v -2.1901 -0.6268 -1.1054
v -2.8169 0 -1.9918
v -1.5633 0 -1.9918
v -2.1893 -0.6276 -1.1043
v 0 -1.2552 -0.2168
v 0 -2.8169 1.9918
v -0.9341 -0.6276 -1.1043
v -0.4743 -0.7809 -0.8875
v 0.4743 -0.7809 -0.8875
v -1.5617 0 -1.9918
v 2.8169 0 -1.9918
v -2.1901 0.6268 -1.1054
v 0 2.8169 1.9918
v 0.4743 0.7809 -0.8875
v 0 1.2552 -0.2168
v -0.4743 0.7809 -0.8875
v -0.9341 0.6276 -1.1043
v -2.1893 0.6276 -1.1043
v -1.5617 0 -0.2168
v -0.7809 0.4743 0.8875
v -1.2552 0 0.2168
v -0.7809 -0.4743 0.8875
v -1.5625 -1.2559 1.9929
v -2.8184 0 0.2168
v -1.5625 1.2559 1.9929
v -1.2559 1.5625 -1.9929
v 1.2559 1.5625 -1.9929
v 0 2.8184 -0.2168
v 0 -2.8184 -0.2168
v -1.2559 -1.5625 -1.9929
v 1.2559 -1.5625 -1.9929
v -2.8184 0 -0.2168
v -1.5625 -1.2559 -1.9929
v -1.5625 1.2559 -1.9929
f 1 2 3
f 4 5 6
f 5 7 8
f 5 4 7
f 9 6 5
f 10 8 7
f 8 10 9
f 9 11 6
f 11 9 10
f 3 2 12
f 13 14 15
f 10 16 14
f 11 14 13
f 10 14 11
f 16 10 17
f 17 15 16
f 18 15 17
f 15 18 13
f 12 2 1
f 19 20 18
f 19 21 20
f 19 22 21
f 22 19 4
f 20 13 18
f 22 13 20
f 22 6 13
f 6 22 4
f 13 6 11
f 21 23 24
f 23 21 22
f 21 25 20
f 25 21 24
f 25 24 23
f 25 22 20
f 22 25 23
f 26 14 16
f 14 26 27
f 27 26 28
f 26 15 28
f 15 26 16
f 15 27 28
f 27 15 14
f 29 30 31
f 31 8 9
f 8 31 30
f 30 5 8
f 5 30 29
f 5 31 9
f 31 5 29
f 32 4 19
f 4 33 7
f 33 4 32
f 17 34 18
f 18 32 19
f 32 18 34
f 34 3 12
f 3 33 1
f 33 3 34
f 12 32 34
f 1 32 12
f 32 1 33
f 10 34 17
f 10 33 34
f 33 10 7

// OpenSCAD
sqrt22 = sqrt(2)/2;
shift = 0.11;




module octahedron() {
    
//     octo_points = [
//        0.5 * [-1, -1, 0], // belt
//        0.5 * [ 1, -1, 0], 
//        0.5 * [ 1,  1, 0], 
//        0.5 * [-1,  1, 0], 
//        [0, 0, sqrt22], // top
//        [0, 0, -sqrt22], // bottom
//    ];
//
//    octo_faces = [
//        [0, 1, 4], // top pyramid
//        [1, 2, 4],
//        [2, 3, 4],
//        [3, 0, 4],
//        [1, 0, 5], // bottom pyramid
//        [2, 1, 5],
//        [3, 2, 5],
//        [0, 3, 5],
//    ];
//    
//
//
//    polyhedron(
//        points = octo_points,
//        faces = octo_faces
//    );
    
    
        intersection(){
        rotate(R0) translate([-1/2, -1, 0]) rotate(acos(sqrt(3)/3) * Y) translate(-1/2 * X) cube(2);
        rotate(R90) translate([-1/2, -1, 0]) rotate(acos(sqrt(3)/3) * Y) translate(-1/2 * X) cube(2);
        rotate(R180) translate([-1/2, -1, 0]) rotate(acos(sqrt(3)/3) * Y) translate(-1/2 * X) cube(2);
        rotate(R270) translate([-1/2, -1, 0]) rotate(acos(sqrt(3)/3) * Y) translate(-1/2 * X) cube(2);
        mirror(Z) rotate(R0) translate([-1/2, -1, 0]) rotate(acos(sqrt(3)/3) * Y) translate(-1/2 * X) cube(2);
        mirror(Z) rotate(R90) translate([-1/2, -1, 0]) rotate(acos(sqrt(3)/3) * Y) translate(-1/2 * X) cube(2);
        mirror(Z) rotate(R180) translate([-1/2, -1, 0]) rotate(acos(sqrt(3)/3) * Y) translate(-1/2 * X) cube(2);
        mirror(Z) rotate(R270) translate([-1/2, -1, 0]) rotate(acos(sqrt(3)/3) * Y) translate(-1/2 * X) cube(2);
        
    }
}

module octo_flake(size, iteration, overlap, slit, throat){
    intersection(){
        inner_flake(size - overlap, iteration, overlap, slit, throat); // Account for the overlap in the total size
        translate([-size, -size, 0]) cube([2, 2, 1] *  size); // Grab the top half
    }
}

 
 module inner_flake(size, iteration, overlap, slit, throat){
     assert(iteration >= 0, "Negative iteration value");
     assert(overlap > slit ||  overlap == 0 && slit == 0  , "Overlap must be greater than slit width");
     
     module smol(translation){
         translate(translation)
         inner_flake(size/2 + 0.01, iteration-1, overlap, slit, throat);
     }
     
     module smol_belt(shift, rotation){
         rotate([0, 0, rotation])
         intersection(){
             #translate([slit/2, slit/2, -size/2]) cube([size, size, size]);
             smol([shift, shift, 0]);
             
         }
     }
     
    if (iteration == 0) { 
        scale([1, 1, 1] * (size + overlap)) octahedron();
    } else {
        shift = 0.25 * size;

//        render()
        intersection() {
            scale((overlap + size) * [1, 1, 1]) octahedron();
            union() {
                cube(2*throat * [1, 1, 1], center=true);
                smol_belt(shift, 0);
                smol_belt(shift, 90);
                smol_belt(shift, 180);
                smol_belt(shift, 270);
                smol([0, 0, shift * 2 * sqrt22 - .001]); // Weld back together with top and bottom sub-octoflakes
                smol([0, 0, -shift * 2 * sqrt22 + .001]);
            };
        };
        
//        render()
//        union(){
//            difference(){
//                union () { 
//                    smol([shift, shift, 0]); // Assemble the belt of sub-octoflakes
//                    smol([shift, -shift, 0]) ;
//                    smol([-shift, -shift, 0]);
//                    smol([-shift, shift, 0]) ;
//                };
//          
//                cube([slit, 2 * size, size], center=true); // Chop apart the belt, to give continious cross-section
//                cube([2 * size, slit, size], center=true);
//          
//            };
//            cube(2*overlap * [1, 1, 1], center=true);
//            smol([0, 0, shift * 2 * sqrt22 - .001]); // Weld back together with top and bottom sub-octoflakes
//            smol([0, 0, -shift * 2 * sqrt22 + .001]);
//        };
      
    }  
 }
 
 
 



//octahedron();


//ref_size = 200;
//ref_i = 7;
//ref_n = 2 ^ ref_i;
//i = 3;
//n= 2 ^ i;
//size = ref_size/ref_n * n;
// 
//unit = 5;
//size = n * (unit-overlap) + overlap;
// 
//overlap = 1;
//slit = 0.5;
//throat = overlap + slit;
//
//
//echo(i, n, size);
//
//octo_flake(size, iteration = i , overlap = overlap, slit = slit, throat = throat);
 
 
 
  
 
 
 
 
 
 







I = [1, 1, 1];
X = [1, 0, 0];
Y = [0, 1, 0];
Z = [0, 0, 1];
R0 = 0 * Z;
R45 = 45 * Z;
R90 = 90 * Z;
R180 = 180 * Z;
R270 = 270 * Z;
T_A = [1/2,     0,      sqrt22/2];
T_B = [-1/2,    0,      sqrt22/2];
T_C = [0,       1/2,    -sqrt22/2];
T_D = [0,       -1/2,   -sqrt22/2];

T_W = [1/2,     0,      -sqrt22/2];
T_X = [-1/2,    0,      -sqrt22/2];
T_Y= [0,       1/2,    sqrt22/2];
T_Z = [0,       -1/2,   sqrt22/2];
eps = 0.01;


module copy_mirror(vec=[0,1,0])
{
    children();
    mirror(vec) children();
}



module sub_octo(iteration, size, overlap, slit){
    
    
    
    rotate(R0) translate( 0 * size * X) sub_octo_sector(iteration, size, overlap, slit, slit/2);
    mirror([1, 1, 0]) translate( 0 * size * X) sub_octo_sector(iteration, size, overlap, slit, slit/2);
    mirror([1, -1, 0]) translate( 0 * size * X) sub_octo_sector(iteration, size, overlap, slit, slit/2);
    mirror([1, 0, 0]) translate( 0 * size * X) sub_octo_sector(iteration, size, overlap, slit, slit/2);
//    rotate(R180) translate( 0 * size * X) sub_octo_sector(iteration, size, overlap, slit);
//    rotate(R270) translate( 0 * size * X) sub_octo_sector(iteration, size, overlap, slit);
    
    
    //// union of sectors 1:12 single sector 30
//    intersection() {
////        translate(size * [ -1, -1, 0]) cube( size * [2, 2, 1]);
//        union() {
//            rotate(R0) translate( size * X) sub_octo_sector(iteration, size, overlap, slit);
////            rotate(R90) translate( size * X) sub_octo_sector(iteration, size, overlap, slit);;
////            rotate(R180) translate( size * X) sub_octo_sector(iteration, size, overlap, slit);
////            rotate(R270) translate( size * X) sub_octo_sector(iteration, size, overlap, slit);
//        }
//    }
//    
    
    
    
//    module cuts() {
//        translate((size- overlap/2) * T_A) octo_cuts(iteration, size - overlap/2, overlap, slit);
//        slits(iteration, size - overlap/2, overlap, slit);
//    }
    
    
    
    
    //// Straight difference 1:25 -1 :23
//    difference() {
//        scale(size * I ) octahedron();
//        translate(-size * Z) cube( 2 * size * I, center = true);
//        
//
//        
//        rotate(R0) translate((size- overlap/2) * T_A) octo_cuts(iteration, size - overlap/2, overlap, slit);
//        rotate(R90) translate((size- overlap/2) * T_A) octo_cuts(iteration, size - overlap/2, overlap, slit);
//        rotate(R180) translate((size- overlap/2) * T_A) octo_cuts(iteration, size - overlap/2, overlap, slit);
//        rotate(R270) translate((size- overlap/2) * T_A) octo_cuts(iteration, size - overlap/2, overlap, slit);
//        
//                        rotate(R0) slits(iteration, size - overlap/2, overlap, slit);
//        rotate(R90) slits(iteration, size - overlap/2, overlap, slit);
//        rotate(R180) slits(iteration, size - overlap/2, overlap, slit);
//        rotate(R270) slits(iteration, size - overlap/2, overlap, slit);
//
//    }


        
    
    //// intersection of sectors 1:52
    
//    module sector() {
//    difference() {
//        scale(size * I ) octahedron();
//        translate(-size * Z) cube( 2 * size * I, center = true);
//        rotate(R0) translate((size- overlap/2) * T_A) octo_cuts(iteration, size - overlap/2, overlap, slit);
//        slits(iteration, size - overlap/2, overlap, slit);
//    }
//}
//    
//
//intersection(){
//            rotate(R0) sector();
//            rotate(R90) sector();
//            rotate(R180) sector();
//            rotate(R270) sector();
//}
    
    
    
}


module sub_octo_sector(iteration, size, overlap, slit, weld_allowance = 0){
    difference(){
        intersection(){
            scale(size * I ) octahedron();
            rotate(-R45) translate(weld_allowance * I) cube(size);
        }
        translate((size- overlap/2) * T_A) octo_cuts(iteration, size - overlap/2, overlap, slit);
        slits(iteration, size - overlap/2, overlap, slit);
    }
};




outer = 0;
face = 1;
edge = 2;




module octo_cuts(iteration, size, overlap, slit, position = outer){
    if (iteration > 0){
//        if (true){
//            intersection() {
//                cube((size - overlap - slit) * [1, 1, 2], center = true);
//                scale(( (size * .999) - overlap ) * I ) tetra();
//            }
//        }
        
        
        if (position == outer){
            intersection() {
                cube((size - overlap - slit) * [1, 1, 2], center = true);
                scale(( (size * .999) - overlap ) * I ) neo_tetra();
            }
            translate(size * T_B/2) octo_cuts(iteration - 1, size/2, overlap, slit, outer);
            translate(size * T_C/2) octo_cuts(iteration - 1, size/2, overlap, slit, outer);
            translate(size * T_D/2) octo_cuts(iteration - 1, size/2, overlap, slit, outer);
            translate(size * T_X/2) octo_cuts(iteration - 1, size/2, overlap, slit, face);
            
            
            // For 3d printing the Koch surface
            
//            translate(size * T_B/2 + size/2) octo_cuts(1, size/2, overlap, slit, outer);
//            translate(size * T_C/2) octo_cuts(1, size/2, overlap, slit, outer);
//            translate(size * T_D/2) octo_cuts(1, size/2, overlap, slit, outer);


        }
        
        if (position == face) {
            intersection() {
                cube((size - overlap - slit) * [1, 1, 2], center = true);
                scale(( (size * .999) - overlap ) * I ) mirror(Z) neo_tetra();
            }
            
            translate(size * T_X/2) octo_cuts(iteration - 1, size/2, overlap, slit, face); // prune
            
            
            
            translate(size * T_B/2) mirror(Z) octo_cuts(iteration - 1, size/2, overlap, slit, face);
            translate(size * T_C/2) rotate(-R90) octo_cuts(iteration - 1, size/2, overlap, slit, face);
            translate(size * T_D/2) rotate(R90) octo_cuts(iteration - 1, size/2, overlap, slit, face);
            

            
            
            translate(size * T_W/2) octo_cuts(iteration - 1, size/2, overlap, slit, edge);
            translate(size * T_Z/2) rotate(240, T_A) octo_cuts(iteration - 1, size/2, overlap, slit, edge);
            translate(size * T_Y/2) rotate(120, T_A) octo_cuts(iteration - 1, size/2, overlap, slit, edge);
            
            
            
//            #translate(size * T_Z/2) translate(100 * T_A) rotate(120, T_A) octo_cuts(iteration - 1, size/2, overlap, slit, edge);
            
//            #translate(size * T_Z/2) rotate(240 * T_D) octo_cuts(iteration - 1, size/2, overlap, slit, edge);
//            #translate(size * T_Z/2) rotate(240 * T_D) octo_cuts(iteration - 1, size/2, overlap, slit, edge);
//            #translate(size * T_Z/2) rotate(240 * T_D) octo_cuts(iteration - 1, size/2, overlap, slit, edge);
//            #translate(size * T_Z/2) rotate(240 * T_D) octo_cuts(iteration - 1, size/2, overlap, slit, edge);
//            #translate(size * T_Z/2) rotate(240 * T_D) octo_cuts(iteration - 1, size/2, overlap, slit, edge);
//            #translate(size * T_Z/2) rotate(240 * T_D) octo_cuts(iteration - 1, size/2, overlap, slit, edge);
//            #translate(size * T_Z/2) rotate(240 * T_D) octo_cuts(iteration - 1, size/2, overlap, slit, edge);
            
            
//            translate(size * T_W/2) rotate(120 * T_A) octo_cuts(iteration - 1, size/2, overlap, slit, edge);
            
            
//            translate(size * T_X/2) rotate(R90) octo_cuts(iteration - 1, size/2, overlap, slit, inner = true);
//            translate(size * T_Y/2) rotate(R90) octo_cuts(iteration - 1, size/2, overlap, slit, inner = true);
//            translate(size * T_Z/2) rotate(R90) octo_cuts(iteration - 1, size/2, overlap, slit, inner = true);
            
            
            
            
        }
        
        if (position == edge){
            intersection() {
                cube((size - overlap - slit) * [1, 1, 2], center = true);
                scale(( (size * .999) - overlap ) * I ) mirror(Z) neo_tetra();
            }
            
            translate(size * T_C/2) rotate(-R90) octo_cuts(iteration - 1, size/2, overlap, slit, face);
            translate(size * T_D/2) rotate(R90) octo_cuts(iteration - 1, size/2, overlap, slit, face);
//            
            translate(size * T_Z/2) rotate(R90) octo_cuts(iteration - 1, size/2, overlap, slit, outer);
            translate(size * T_Y/2) rotate(-R90) octo_cuts(iteration - 1, size/2, overlap, slit, outer);
            
            translate(size * T_X/2) octo_cuts(iteration - 1, size/2, overlap, slit, edge);
            translate(size * T_W/2) octo_cuts(iteration - 1, size/2, overlap, slit, edge);
            
            
            
        }

        
//        if (inner){
//            translate(size * T_A/2) octo_cuts(iteration - 1, size/2, overlap, slit, inner = true);
//            translate(size * T_B/2) octo_cuts(iteration - 1, size/2, overlap, slit, inner = true);
//            translate(size * T_C/2) octo_cuts(iteration - 1, size/2, overlap, slit, inner = true);
//            translate(size * T_D/2) octo_cuts(iteration - 1, size/2, overlap, slit, inner = true);
//
//            
//            
//
////            translate(size * T_W/2) rotate(R90) octo_cuts(iteration - 1, size/2, overlap, slit, inner = true);
//            translate(size * T_X/2) rotate(R90) octo_cuts(iteration - 1, size/2, overlap, slit, inner = true);
//            translate(size * T_Y/2) rotate(R90) octo_cuts(iteration - 1, size/2, overlap, slit, inner = true);
//            translate(size * T_Z/2) rotate(R90) octo_cuts(iteration - 1, size/2, overlap, slit, inner = true);
//            
//            
//        } else {
//            translate(size * T_B/2) octo_cuts(iteration - 1, size/2, overlap, slit);
//            translate(size * T_C/2) octo_cuts(iteration - 1, size/2, overlap, slit);
//            translate(size * T_D/2) octo_cuts(iteration - 1, size/2, overlap, slit);
//            translate(size * T_X/2) mirror(Z) octo_cuts(iteration - 1, size/2, overlap, slit, inner = true);
//        }




    }
}


module slits(iteration, size, overlap, slit, skip = false){
    
    ts = size;
    
    if (iteration > 0){// && !skip){
        length = size- overlap - sqrt22 * slit ;
        translate([length/2 + overlap/2 + slit/2,0, 0]) cube([length, slit, (overlap + 2*slit) * sqrt22], center = true);
    }
    
    if (iteration > 0){
        translate([0, 0, ts * sqrt22/2]) slits(iteration -1, size/2, overlap, slit, skip = false); // top
        translate([ts/4, ts/4, 0]) slits(iteration -1, size/2, overlap, slit, skip); // bottom right
        translate([ts/4, -ts/4, 0]) slits(iteration -1, size/2, overlap, slit, skip); // bottom left
        
        
        translate([ts/4, -ts/4, 0]) rotate(R90) slits(iteration -1, size/2, overlap, slit, skip = false); // inside left
        translate([ts/4, ts/4, 0]) rotate(-R90) slits(iteration -1, size/2, overlap, slit, skip = true); // inside right
        
        
        translate([0, 0, ts * sqrt22/2]) mirror(Z) slits(iteration -1, size/2, overlap, slit, skip = false); // inside top

        

    }
}

//module tetra(){
//    tetra_points = [
//        [ -1, -1, -1],
//        [  1,  1, -1],
//        [ -1,  1,  1],
//        [  1, -1,  1],
//    ];
//
//    tetra_faces = [
//        [0, 1, 2],
//        [0, 3, 1],
//        [0, 2, 3],
//        [1, 3, 2]
//    ];
//
//    rotate(-45 * Z)
//    scale(sqrt22/2 * I)
//    polyhedron(
//        points = tetra_points,
//        faces = tetra_faces
//    );
//}

module neo_tetra(){
    scale(sqrt22/2 * I)
    intersection(){
        translate(- Z-1.5 * X) rotate( acos(1/3)/2, X)  cube(3);
        translate(- Z-1.5 * X) rotate( - acos(1/3)/2 +90, X)  cube(3);
        translate( Z-1.5 * Y) rotate([acos(1/3)/2 + 180, 0, 90])  cube(3);
        translate( Z-1.5 * Y) rotate([-acos(1/3)/2 + 270, 0, 90])  cube(3);
        
//                translate(- Z-1.5 * X) rotate( acos(1/3)/2, X)  cube(3);
//        translate(- Z-1.5 * X) rotate( - acos(1/3)/2 +90, X)  cube(3);
//        translate( Z-1.5 * Y) rotate([acos(1/3)/2 + 180, 0, 90])  cube(3);
//        translate( Z-1.5 * Y) rotate([-acos(1/3)/2 + 270, 0, 90])  cube(3);

        
        
        
    }
    
    
    
    
}


module neo_octahedron() {
    
    intersection(){
        rotate(R0) translate([-1/2, -1, 0]) rotate(acos(sqrt(3)/3) * Y) translate(-1/2 * X) cube(2);
        rotate(R90) translate([-1/2, -1, 0]) rotate(acos(sqrt(3)/3) * Y) translate(-1/2 * X) cube(2);
        rotate(R180) translate([-1/2, -1, 0]) rotate(acos(sqrt(3)/3) * Y) translate(-1/2 * X) cube(2);
        rotate(R270) translate([-1/2, -1, 0]) rotate(acos(sqrt(3)/3) * Y) translate(-1/2 * X) cube(2);
        mirror(Z) rotate(R0) translate([-1/2, -1, 0]) rotate(acos(sqrt(3)/3) * Y) translate(-1/2 * X) cube(2);
        mirror(Z) rotate(R90) translate([-1/2, -1, 0]) rotate(acos(sqrt(3)/3) * Y) translate(-1/2 * X) cube(2);
        mirror(Z) rotate(R180) translate([-1/2, -1, 0]) rotate(acos(sqrt(3)/3) * Y) translate(-1/2 * X) cube(2);
        mirror(Z) rotate(R270) translate([-1/2, -1, 0]) rotate(acos(sqrt(3)/3) * Y) translate(-1/2 * X) cube(2);
        
    }
}


//#octahedron();
//#neo_octahedron();


ref_size = 200;
ref_i = 7;
ref_n = 2 ^ ref_i;

i = 2;
iteration = i;
n= 2 ^ i;

size = ref_size/ref_n * n;
overlap = 2 * .3  + .01;
slit =  .001;
throat = overlap + slit;


echo(i, n, size, overlap);


//iteration = 3;
//size = 100;
//overlap = 5;
//slit = 1;


//aug_tetra(size, overlap, slit);


//tetra();
//neo_tetra();

render() octo_cuts(i, size, overlap, slit);
//sub_octo(i, size, overlap, slit);

//module ss(){
//    sub_octo_sector(iteration - 1, size/2+ overlap/2, overlap, slit);
//}
//
//
//
//XY = X + Y;
//YX = X - Y;
//
//
//module bottom(){
//    intersection(){ #translate(( slit)/2 * Y )cube(2 * size * I); translate(size/4 * (X + Y))ss();}
//}
//
//module top(){
//    translate(sqrt22 *(size/2) * Z) ss();
//}
//
//module inside_top(){
//    intersection(){ #translate(-size * Y)cube(2 * size * I); translate(sqrt22 * (size/2) * Z) mirror(Z) ss();}
//    
//    
//}
//
//module inside(){
//    intersection(){ #translate(( slit)/2 * Y )cube(2 * size * I); translate( size/4 * (X + Y)) rotate(-R90) ss();}
//    
//    
//    
//}
//
//rotate(R0) bottom();
//rotate(R0) mirror(Y) bottom();
//rotate(R90) bottom();
//rotate(R90) mirror(Y) bottom();
//rotate(R180) bottom();
//rotate(R180) mirror(Y) bottom();
//rotate(R270) bottom();
//rotate(R270) mirror(Y) bottom();
//
//rotate(R0) top();
//rotate(R90) top();
//rotate(R180) top();
//rotate(R270) top();
//
//rotate(R0) inside_top();
//rotate(R90) inside_top();
//rotate(R180) inside_top();
//rotate(R270) inside_top();
//
//rotate(R0) inside();
//rotate(R0) mirror(Y) inside();
//rotate(R90) inside();
//rotate(R90) mirror(Y) inside();
//rotate(R180) inside();
//rotate(R180) mirror(Y) inside();
//rotate(R270) inside();
//rotate(R270) mirror(Y) inside();


//translate(sqrt22 * size/2 * (X - Y)) ss();


//translate((size/2) * Z) ss();
//translate(sqrt22 * size/2 * (X + Y)) rotate(-R90) ss();
//translate(sqrt22 * size/2 * (X - Y)) rotate(R90) ss();
//translate(size/2 * Z) mirror(Z) ss();

//mirror([1, 1, 0]) translate(sqrt22 * size/2 * (X + Y)) ss();
//mirror([1, 1, 0]) translate(sqrt22 * size/2 * (X - Y)) ss();
//mirror([1, 1, 0]) translate((size/2) * Z) ss();
//mirror([1, 1, 0]) translate(sqrt22 * size/2 * (X + Y)) rotate(-R90) ss();
//mirror([1, 1, 0]) translate(sqrt22 * size/2 * (X - Y)) rotate(R90) ss();
//mirror([1, 1, 0]) translate(size/2 * Z) mirror(Z) ss();
//
//mirror([1, -1, 0]) translate(sqrt22 * size/2 * (X + Y)) ss();
//mirror([1, -1, 0]) translate(sqrt22 * size/2 * (X - Y)) ss();
//mirror([1, -1, 0]) translate((size/2) * Z) ss();
//mirror([1, -1, 0]) translate(sqrt22 * size/2 * (X + Y)) rotate(-R90) ss();
//mirror([1, -1, 0]) translate(sqrt22 * size/2 * (X - Y)) rotate(R90) ss();
//mirror([1, -1, 0]) translate(size/2 * Z) mirror(Z) ss();
//
//mirror([1, 0, 0]) translate(sqrt22 * size/2 * (X + Y)) ss();
//mirror([1, 0, 0]) translate(sqrt22 * size/2 * (X - Y)) ss();
//mirror([1, 0, 0]) translate((size/2) * Z) ss();
//mirror([1, 0, 0]) translate(sqrt22 * size/2 * (X + Y)) rotate(-R90) ss();
//mirror([1, 0, 0]) translate(sqrt22 * size/2 * (X - Y)) rotate(R90) ss();
//mirror([1, 0, 0]) translate(size/2 * Z) mirror(Z) ss();


//sub_octo_sector(iteration, size, overlap, slit);
//mirror([1, 1, 0]) translate( 0 * size * X) sub_octo_sector(iteration, size, overlap, slit);


//translate( 0 * size * X) sub_octo_sector(iteration, size, overlap, slit);
//mirror([1, 1, 0]) translate( 0 * size * X) sub_octo_sector(iteration, size, overlap, slit);
//mirror([1, -1, 0]) translate( 0 * size * X) sub_octo_sector(iteration, size, overlap, slit);
//mirror([1, 0, 0]) translate( 0 * size * X) sub_octo_sector(iteration, size, overlap, slit);



//module sector() {
//    intersection(){
//        sub_octo(i, size, overlap, slit);
//        rotate(-R45) translate(-slit * I) cube(size);
//    }
//}


//render() {
//    intersection() {
//        translate(size * [ -1, -1, 0]) cube( size * [2, 2, 1]);
//        union() {
//            rotate(R0) sector();
 //           rotate(R90) sector();
 //           rotate(R180) sector();
 //           rotate(R270) sector();
 //       }
 //   }
//}

// // Testing whether we can do rotations easily
//intersection(){
//    rotate(R0) sub_octo(i, size, overlap, slit);
//    rotate(R90) sub_octo(i, size, overlap, slit);
//    rotate(R180) sub_octo(i, size, overlap, slit);
//    rotate(R270) sub_octo(i, size, overlap, slit);
//
//}


//slits(iteration, size-overlap/2, overlap, slit);


//render()

//difference() {
//    scale((size + overlap) * I ) octahedron();
//    translate(-size * I) cube(size * [2, 2, 1]);
//    sub_octo(iteration, size, overlap);
//}




//
//module sector(){
//    tetra_points = [
//        [ 0, 0, 0],
//        [ 1, 0, 0],
//        [ 0, 1, 0],
//        [ 0, 0, 1],
//    ];
//
//    tetra_faces = [
//        [0, 1, 2],
//        [0, 3, 1],
//        [0, 2, 3],
//        [1, 3, 2]
//    ];
//
//    rotate(-45 * Z)
////    scale(sqrt22/2 * I)
//    polyhedron(
//        points = tetra_points,
//        faces = tetra_faces
//    );
//}
//
//
//
//
//
//module sector_flake(iteration, size, overlap, slit){
//    intersection() {
//        translate(size * [ -1, -1, 0]) cube( size * [2, 2, 1]);
//        union() {
//            rotate(R0) sub_octo_sector(iteration, size, overlap, slit);;
//            rotate(R90) sub_octo_sector(iteration, size, overlap, slit);;
//            rotate(R180) sub_octo_sector(iteration, size, overlap, slit);
//            rotate(R270) sub_octo_sector(iteration, size, overlap, slit);
//        }
//    }
//}
//
//module sub_sector(iteration, size, overlap, slit){
//    
//    
//    module ss(jitter = 0){
//        sub_sector(iteration-1, size/2 + jitter, overlap, slit);
//    }   
//    
//
//
//    
//    if (iteration == 0){
//        scale((size + overlap) * I) sector();
//    } else {
//        translate(sqrt22 * size/2 * (X + Y)) ss(.001);
//        translate(sqrt22 * size/2 * (X - Y)) ss(.002);
//        translate((size/2) * Z) ss(.003);
//        
//        translate(sqrt22 * size/2 * (X + Y)) rotate(-R90) ss(.0015);
//        translate(sqrt22 * size/2 * (X - Y)) rotate(R90) ss(.0025);
//        translate(size/2 * Z) mirror(Z) ss(.0035);
//        
//        
//    }
//    
//    
//    
//    
//}
//
//
//
//ref_size = 200;
//ref_i = 8;
//ref_n = 2 ^ ref_i;
//i = 1;
//n= 2 ^ i;
//size = 100;
//overlap = 1;
//slit = .001;
//throat = overlap + slit;
//
//
//
////#sub_sector(0, size, overlap, slit);
//sub_sector(i, size, overlap, slit, jitter);
